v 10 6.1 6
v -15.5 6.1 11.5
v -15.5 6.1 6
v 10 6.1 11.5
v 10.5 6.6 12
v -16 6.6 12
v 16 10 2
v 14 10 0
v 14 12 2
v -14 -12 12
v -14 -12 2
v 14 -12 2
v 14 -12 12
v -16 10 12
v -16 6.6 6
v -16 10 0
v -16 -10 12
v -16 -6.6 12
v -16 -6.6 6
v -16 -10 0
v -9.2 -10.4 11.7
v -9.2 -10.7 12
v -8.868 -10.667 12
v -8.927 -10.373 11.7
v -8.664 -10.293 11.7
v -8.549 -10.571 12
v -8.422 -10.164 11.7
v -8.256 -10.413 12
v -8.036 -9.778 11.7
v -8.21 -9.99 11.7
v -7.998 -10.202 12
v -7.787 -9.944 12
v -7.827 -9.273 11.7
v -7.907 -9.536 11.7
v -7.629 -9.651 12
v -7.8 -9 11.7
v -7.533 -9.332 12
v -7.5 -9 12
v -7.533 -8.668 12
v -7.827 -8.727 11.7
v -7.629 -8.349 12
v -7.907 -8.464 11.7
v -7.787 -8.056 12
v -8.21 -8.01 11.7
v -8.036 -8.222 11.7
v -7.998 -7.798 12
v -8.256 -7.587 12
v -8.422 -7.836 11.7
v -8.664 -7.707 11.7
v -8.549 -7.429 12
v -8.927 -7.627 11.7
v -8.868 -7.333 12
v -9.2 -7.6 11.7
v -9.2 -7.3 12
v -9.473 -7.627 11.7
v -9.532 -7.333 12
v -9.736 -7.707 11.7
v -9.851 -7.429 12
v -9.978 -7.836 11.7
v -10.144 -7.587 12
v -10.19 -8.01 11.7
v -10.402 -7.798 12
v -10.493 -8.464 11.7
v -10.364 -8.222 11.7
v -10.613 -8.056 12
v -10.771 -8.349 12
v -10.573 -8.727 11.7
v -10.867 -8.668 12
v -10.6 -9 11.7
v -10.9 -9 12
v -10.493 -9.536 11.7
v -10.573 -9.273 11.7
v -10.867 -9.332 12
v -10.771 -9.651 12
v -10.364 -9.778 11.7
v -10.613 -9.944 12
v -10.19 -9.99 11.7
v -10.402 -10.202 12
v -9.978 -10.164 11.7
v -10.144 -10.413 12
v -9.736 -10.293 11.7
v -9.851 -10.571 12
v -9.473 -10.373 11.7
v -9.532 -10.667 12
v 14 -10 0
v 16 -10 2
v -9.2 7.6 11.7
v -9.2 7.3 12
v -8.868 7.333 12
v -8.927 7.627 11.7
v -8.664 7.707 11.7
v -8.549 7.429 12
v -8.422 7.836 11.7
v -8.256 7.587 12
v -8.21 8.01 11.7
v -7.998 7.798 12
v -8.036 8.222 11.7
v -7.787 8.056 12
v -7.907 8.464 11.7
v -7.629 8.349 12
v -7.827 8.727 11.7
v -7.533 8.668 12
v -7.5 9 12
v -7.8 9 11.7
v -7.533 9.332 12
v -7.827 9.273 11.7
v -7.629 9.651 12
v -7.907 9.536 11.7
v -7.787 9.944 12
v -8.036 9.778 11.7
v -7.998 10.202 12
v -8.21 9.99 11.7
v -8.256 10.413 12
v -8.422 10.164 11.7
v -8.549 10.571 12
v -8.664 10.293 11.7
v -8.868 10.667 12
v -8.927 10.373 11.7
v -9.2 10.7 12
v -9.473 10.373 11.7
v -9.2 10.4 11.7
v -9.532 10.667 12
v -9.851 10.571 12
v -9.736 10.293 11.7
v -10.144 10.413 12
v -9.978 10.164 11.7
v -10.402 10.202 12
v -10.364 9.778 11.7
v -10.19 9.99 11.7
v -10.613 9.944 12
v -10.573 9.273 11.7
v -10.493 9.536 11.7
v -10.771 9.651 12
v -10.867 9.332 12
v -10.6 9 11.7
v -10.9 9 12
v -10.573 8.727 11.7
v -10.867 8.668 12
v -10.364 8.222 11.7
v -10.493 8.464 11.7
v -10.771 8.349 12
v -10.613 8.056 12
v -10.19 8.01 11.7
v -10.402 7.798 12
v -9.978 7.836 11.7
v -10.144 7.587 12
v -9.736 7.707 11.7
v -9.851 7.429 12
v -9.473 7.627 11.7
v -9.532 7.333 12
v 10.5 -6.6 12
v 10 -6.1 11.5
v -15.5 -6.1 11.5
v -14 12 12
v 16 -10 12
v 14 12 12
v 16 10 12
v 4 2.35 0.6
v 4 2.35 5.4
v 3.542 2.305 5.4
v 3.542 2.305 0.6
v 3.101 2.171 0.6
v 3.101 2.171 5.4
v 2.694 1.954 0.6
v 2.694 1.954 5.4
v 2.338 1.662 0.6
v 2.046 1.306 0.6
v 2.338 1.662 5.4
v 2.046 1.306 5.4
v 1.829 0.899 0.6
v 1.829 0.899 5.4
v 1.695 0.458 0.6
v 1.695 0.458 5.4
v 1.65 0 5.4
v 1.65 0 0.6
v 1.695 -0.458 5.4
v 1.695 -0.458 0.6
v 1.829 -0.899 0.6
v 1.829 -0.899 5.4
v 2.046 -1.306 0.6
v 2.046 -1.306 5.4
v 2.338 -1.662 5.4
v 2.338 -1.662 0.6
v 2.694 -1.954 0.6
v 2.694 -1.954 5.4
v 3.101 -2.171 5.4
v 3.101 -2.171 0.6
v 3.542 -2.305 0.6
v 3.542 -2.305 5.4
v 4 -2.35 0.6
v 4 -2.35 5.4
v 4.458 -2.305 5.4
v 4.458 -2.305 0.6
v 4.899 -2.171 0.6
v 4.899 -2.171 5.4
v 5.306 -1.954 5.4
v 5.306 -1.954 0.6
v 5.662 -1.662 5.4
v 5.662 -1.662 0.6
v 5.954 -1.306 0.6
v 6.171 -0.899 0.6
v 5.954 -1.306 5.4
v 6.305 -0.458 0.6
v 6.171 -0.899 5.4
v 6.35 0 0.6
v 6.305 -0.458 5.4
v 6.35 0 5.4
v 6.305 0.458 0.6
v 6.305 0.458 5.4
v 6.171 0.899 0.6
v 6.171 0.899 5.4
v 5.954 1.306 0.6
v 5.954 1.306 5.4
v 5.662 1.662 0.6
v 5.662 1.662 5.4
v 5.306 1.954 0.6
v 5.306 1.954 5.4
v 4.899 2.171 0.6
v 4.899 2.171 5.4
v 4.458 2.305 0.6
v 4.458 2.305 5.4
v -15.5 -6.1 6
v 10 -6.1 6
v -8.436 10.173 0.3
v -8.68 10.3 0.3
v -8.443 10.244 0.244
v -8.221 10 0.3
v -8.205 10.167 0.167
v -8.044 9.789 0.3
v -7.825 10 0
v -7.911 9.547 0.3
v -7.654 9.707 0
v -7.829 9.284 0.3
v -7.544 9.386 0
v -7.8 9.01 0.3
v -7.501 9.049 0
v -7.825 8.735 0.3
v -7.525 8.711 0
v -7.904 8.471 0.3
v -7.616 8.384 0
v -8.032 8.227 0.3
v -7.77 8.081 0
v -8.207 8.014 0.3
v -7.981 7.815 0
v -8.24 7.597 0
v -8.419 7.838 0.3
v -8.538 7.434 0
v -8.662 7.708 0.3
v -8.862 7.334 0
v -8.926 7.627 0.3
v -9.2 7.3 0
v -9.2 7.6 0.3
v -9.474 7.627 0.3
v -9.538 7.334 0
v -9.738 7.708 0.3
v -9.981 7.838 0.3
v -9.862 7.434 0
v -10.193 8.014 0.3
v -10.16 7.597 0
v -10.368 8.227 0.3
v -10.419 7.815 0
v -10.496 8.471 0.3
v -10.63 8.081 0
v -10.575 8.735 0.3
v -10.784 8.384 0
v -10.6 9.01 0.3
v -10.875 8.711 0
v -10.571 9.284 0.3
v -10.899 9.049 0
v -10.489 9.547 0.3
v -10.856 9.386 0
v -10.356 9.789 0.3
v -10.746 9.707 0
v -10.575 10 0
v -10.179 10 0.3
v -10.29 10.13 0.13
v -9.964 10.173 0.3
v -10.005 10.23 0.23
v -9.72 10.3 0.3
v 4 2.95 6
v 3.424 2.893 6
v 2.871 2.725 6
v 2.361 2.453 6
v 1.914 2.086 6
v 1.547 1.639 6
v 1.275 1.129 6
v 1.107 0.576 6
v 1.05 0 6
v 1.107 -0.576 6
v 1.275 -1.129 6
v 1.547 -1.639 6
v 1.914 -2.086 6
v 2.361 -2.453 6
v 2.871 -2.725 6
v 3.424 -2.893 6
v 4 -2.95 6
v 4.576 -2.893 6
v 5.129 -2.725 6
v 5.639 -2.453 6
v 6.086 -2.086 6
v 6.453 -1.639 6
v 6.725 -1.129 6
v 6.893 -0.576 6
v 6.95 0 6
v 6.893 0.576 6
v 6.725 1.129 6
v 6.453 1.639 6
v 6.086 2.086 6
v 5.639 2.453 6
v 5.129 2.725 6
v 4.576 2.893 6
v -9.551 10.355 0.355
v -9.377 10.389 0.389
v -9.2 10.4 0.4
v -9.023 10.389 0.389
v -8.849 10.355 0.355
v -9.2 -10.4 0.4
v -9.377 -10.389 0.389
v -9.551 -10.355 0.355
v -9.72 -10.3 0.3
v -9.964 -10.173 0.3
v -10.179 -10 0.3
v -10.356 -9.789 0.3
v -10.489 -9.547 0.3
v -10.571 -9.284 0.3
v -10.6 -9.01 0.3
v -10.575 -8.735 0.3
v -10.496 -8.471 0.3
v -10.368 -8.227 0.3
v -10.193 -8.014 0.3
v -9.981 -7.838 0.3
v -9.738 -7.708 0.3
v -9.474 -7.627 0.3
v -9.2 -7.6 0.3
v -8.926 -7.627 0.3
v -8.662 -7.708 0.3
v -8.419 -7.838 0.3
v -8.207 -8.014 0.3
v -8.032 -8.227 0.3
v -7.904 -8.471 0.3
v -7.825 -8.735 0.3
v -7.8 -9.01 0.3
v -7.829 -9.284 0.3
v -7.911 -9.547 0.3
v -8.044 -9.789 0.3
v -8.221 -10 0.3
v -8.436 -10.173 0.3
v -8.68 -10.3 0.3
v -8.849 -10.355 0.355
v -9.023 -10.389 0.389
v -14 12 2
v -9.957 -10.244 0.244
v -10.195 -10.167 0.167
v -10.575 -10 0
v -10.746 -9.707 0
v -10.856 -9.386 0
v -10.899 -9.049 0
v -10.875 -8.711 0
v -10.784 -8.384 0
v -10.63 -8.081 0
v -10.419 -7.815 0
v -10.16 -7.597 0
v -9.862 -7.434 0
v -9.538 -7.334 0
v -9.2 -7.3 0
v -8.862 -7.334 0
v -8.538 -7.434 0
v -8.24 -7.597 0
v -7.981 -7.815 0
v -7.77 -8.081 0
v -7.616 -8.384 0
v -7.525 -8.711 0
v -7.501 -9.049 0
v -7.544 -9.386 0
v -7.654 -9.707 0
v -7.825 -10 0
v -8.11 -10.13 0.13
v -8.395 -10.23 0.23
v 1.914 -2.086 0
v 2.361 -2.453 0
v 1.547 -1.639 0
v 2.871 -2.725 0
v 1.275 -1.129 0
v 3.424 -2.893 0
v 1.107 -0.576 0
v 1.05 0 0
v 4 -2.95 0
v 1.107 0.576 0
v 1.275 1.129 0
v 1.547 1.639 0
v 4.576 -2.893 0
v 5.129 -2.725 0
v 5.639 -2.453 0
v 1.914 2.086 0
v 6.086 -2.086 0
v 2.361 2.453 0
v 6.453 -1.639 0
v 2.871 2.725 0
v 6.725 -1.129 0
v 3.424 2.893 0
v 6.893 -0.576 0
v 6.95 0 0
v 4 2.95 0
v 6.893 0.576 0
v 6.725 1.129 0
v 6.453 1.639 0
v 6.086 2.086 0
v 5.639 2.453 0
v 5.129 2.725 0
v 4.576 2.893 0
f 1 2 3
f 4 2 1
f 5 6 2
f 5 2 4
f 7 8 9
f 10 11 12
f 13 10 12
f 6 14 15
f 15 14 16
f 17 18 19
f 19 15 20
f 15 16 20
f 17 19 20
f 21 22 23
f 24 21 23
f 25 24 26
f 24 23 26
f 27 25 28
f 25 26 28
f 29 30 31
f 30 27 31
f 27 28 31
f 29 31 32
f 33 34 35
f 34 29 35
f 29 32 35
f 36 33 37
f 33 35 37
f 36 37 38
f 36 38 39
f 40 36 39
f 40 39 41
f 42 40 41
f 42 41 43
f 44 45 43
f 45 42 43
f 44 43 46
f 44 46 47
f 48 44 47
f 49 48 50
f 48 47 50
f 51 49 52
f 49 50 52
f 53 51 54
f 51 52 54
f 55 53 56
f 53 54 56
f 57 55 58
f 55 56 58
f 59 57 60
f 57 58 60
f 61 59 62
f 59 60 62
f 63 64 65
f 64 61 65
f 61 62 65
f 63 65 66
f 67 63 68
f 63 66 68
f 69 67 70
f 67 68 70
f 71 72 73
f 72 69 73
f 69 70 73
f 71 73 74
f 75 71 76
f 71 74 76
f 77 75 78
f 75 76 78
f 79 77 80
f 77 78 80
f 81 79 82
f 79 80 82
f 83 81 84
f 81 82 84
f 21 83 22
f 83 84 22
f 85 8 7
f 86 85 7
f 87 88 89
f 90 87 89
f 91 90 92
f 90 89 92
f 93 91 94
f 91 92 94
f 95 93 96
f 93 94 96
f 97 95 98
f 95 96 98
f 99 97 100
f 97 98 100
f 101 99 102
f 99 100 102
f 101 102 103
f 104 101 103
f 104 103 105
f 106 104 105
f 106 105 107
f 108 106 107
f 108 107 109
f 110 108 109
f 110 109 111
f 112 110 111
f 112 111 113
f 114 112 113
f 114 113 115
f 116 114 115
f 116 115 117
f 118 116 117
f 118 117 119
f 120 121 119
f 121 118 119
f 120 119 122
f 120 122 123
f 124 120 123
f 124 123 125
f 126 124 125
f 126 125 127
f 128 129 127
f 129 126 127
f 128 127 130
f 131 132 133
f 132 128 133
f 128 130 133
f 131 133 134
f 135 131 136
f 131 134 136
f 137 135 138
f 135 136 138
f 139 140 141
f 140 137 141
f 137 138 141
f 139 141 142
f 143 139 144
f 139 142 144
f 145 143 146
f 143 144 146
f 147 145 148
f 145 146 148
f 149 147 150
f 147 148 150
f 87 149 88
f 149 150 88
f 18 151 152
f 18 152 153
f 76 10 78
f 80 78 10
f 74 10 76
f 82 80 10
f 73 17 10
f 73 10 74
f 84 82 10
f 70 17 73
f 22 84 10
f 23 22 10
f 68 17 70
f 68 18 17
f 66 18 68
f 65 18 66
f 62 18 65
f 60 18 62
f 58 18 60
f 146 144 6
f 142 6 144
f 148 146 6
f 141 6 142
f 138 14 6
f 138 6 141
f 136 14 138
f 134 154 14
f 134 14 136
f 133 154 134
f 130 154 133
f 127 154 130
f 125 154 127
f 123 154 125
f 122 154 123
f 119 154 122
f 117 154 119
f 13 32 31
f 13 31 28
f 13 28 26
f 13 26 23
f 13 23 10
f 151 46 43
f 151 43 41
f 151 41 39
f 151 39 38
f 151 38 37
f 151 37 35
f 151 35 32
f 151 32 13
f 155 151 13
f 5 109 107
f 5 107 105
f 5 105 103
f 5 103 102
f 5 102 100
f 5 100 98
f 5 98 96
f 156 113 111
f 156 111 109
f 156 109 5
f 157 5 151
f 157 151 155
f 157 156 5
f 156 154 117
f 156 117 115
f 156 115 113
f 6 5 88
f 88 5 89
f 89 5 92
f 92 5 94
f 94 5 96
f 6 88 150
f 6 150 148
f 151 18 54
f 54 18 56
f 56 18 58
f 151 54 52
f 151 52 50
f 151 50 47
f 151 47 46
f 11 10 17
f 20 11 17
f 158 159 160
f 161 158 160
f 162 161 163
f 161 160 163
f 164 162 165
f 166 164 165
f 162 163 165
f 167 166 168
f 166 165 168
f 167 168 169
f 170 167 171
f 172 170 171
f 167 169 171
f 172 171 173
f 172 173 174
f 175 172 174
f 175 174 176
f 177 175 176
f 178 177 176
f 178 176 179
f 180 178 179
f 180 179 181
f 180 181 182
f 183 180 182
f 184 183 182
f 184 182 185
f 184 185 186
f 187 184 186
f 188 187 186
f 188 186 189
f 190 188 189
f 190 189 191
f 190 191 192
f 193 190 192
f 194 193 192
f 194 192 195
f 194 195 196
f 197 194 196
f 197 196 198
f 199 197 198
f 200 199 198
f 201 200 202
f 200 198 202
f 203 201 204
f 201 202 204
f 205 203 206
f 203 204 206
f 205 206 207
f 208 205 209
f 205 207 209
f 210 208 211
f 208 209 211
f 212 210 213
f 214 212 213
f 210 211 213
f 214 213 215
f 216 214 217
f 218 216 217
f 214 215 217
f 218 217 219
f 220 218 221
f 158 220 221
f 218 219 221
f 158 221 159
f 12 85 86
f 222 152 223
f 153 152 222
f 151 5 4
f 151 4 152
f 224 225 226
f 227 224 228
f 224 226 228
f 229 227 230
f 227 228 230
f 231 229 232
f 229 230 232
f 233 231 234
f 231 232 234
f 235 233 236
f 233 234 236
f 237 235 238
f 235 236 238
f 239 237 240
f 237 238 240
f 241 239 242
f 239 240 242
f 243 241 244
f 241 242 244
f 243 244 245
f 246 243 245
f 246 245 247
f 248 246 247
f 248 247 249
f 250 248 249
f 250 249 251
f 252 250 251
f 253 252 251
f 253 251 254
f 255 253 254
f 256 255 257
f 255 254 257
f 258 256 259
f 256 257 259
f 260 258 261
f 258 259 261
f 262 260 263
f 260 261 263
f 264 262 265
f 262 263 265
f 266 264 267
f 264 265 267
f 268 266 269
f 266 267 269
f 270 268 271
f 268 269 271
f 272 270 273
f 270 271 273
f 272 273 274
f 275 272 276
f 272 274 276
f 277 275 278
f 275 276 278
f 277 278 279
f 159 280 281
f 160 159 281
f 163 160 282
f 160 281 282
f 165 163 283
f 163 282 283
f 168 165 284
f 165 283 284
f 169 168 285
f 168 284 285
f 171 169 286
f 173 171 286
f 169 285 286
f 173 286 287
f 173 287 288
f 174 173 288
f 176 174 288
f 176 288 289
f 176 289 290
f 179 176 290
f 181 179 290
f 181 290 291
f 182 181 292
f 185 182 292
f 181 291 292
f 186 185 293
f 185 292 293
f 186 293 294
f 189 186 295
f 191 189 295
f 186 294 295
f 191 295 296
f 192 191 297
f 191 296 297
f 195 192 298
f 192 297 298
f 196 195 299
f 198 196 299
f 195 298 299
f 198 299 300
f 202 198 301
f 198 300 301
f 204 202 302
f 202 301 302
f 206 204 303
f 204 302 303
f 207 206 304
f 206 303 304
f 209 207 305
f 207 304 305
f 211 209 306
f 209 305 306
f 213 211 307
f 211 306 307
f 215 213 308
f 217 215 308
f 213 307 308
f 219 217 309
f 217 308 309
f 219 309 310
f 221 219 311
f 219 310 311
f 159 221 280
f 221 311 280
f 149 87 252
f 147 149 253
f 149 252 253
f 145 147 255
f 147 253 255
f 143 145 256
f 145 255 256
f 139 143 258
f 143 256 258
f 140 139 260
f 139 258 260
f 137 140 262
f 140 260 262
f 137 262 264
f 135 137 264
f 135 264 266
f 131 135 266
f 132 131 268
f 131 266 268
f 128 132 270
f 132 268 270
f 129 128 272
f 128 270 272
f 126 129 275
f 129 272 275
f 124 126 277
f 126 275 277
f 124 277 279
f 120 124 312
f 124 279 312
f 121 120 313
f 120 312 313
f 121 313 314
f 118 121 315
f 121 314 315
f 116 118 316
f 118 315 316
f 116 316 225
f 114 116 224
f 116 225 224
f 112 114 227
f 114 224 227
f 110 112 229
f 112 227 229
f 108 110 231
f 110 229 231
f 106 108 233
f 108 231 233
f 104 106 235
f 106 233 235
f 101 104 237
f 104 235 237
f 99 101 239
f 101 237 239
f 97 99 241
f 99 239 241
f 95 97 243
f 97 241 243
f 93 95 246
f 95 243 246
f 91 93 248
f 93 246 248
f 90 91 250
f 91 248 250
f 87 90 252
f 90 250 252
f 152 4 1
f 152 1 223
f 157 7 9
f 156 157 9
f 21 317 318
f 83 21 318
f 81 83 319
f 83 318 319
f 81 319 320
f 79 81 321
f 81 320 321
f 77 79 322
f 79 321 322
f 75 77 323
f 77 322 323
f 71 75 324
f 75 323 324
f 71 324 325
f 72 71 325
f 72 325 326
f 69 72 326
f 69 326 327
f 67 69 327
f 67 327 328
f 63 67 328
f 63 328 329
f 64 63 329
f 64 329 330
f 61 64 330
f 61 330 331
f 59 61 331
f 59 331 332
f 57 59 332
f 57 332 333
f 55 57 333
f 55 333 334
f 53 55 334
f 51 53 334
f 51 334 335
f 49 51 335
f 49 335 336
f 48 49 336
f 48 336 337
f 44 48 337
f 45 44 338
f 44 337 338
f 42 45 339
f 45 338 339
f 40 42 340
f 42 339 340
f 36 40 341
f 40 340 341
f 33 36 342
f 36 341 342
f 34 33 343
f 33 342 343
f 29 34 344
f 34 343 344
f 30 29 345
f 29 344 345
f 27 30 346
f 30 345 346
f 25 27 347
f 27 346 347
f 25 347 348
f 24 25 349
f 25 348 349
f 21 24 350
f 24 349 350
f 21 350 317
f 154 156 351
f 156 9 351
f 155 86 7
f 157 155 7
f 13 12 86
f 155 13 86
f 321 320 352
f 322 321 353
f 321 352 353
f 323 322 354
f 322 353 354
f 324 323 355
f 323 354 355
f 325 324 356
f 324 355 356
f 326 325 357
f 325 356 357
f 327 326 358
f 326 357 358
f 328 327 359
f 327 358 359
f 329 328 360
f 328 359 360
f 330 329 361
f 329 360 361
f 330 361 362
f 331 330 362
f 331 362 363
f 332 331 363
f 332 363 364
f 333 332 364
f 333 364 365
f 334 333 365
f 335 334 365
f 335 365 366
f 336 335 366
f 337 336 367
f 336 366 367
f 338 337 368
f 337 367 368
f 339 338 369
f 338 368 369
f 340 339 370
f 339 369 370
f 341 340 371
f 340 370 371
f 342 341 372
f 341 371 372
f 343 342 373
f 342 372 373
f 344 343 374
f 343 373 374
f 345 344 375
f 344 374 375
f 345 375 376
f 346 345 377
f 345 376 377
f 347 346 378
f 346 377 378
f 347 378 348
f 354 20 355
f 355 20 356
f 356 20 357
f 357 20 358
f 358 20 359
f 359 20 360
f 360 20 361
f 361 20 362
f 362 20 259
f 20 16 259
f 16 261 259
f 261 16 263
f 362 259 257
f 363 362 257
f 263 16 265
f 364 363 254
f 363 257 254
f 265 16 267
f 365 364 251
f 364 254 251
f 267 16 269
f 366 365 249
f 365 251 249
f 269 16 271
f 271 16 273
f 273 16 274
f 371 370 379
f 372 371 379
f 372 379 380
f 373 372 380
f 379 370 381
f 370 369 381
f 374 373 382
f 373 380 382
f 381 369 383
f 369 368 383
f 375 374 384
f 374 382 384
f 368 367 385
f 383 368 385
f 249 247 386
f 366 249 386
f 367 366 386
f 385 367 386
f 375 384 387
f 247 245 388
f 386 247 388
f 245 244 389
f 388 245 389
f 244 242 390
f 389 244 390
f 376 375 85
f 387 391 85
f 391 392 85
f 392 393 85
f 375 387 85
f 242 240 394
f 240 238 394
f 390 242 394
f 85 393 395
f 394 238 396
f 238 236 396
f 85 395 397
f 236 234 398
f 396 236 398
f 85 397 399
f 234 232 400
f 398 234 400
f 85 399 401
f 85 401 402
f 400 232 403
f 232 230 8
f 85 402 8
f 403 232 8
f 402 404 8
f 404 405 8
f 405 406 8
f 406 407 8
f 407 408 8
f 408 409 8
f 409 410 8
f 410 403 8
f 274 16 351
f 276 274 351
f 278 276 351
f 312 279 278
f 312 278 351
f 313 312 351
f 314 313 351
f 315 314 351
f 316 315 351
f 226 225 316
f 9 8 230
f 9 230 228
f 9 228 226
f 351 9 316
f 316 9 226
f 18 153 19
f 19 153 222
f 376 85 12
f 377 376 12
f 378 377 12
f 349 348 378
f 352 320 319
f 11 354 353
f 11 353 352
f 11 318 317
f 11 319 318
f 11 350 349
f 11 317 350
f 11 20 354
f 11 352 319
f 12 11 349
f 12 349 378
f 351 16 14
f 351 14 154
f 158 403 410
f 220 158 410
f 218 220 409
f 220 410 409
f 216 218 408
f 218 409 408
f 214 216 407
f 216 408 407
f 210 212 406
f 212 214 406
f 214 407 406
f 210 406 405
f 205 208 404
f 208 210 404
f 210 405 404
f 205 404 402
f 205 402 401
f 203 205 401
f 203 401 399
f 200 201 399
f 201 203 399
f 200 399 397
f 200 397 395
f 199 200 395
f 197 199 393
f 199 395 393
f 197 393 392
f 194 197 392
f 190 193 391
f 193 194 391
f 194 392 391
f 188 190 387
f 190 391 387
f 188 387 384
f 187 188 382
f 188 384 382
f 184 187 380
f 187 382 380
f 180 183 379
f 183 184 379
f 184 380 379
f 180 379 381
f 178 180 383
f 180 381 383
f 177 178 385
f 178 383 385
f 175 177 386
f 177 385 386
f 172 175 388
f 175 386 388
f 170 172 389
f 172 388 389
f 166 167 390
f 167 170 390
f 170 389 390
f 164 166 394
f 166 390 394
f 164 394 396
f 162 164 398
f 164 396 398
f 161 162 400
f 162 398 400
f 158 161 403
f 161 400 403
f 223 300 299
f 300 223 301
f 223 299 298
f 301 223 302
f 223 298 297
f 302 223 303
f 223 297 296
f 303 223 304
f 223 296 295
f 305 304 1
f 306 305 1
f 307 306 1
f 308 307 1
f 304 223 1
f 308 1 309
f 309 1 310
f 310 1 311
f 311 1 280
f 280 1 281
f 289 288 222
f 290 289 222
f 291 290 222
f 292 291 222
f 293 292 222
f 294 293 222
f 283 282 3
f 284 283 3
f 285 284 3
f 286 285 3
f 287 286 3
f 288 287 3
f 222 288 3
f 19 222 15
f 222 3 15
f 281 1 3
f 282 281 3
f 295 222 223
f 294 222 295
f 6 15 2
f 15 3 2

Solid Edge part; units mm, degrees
sketch "Sketch1" plane through (0, 0, 0) normal (0, 0, 1) x (1, 0, 0)
  line L0 (-16, -12) -> (16, -12)
  line L1 (16, -12) -> (16, 12)
  line L2 (16, 12) -> (-16, 12)
  line L3 (-16, 12) -> (-16, -12)
  dimension "D1" = 24
  dimension "D2" = 32
extrude "Protrusion1" add sketch "Sketch1" along normal blind 12
sketch "Sketch2" plane through (0, 0, 12) normal (0, 0, 1) x (0, 1, 0)
  line L0 (-6.1, 16) -> (6.1, 16)
  line L1 (6.1, 16) -> (6.1, -10)
  line L2 (6.1, -10) -> (-6.1, -10)
  line L3 (-6.1, -10) -> (-6.1, 16)
  dimension "D1" = 12.2
  dimension "D2" = 26
extrude "servo_cutout" cut sketch "Sketch2" against normal blind 6
hole "screw_bearing" at (4, 0, 0) direction (0, 0, 1) diameter 4.7 depth 30 tip angle 118 start chamfer 0.6 start chamfer angle 45 end chamfer 0.6 end chamfer angle 45
chamfer "Chamfer1" distance 0.5 angle 45 5 edges at (-3, -6.1, 12) (-16, -6.1, 9) (10, 0, 12) (-3, 6.1, 12) (-16, 6.1, 9)
hole "Hole1" at (-9.2, 9, 12) direction (0, 0, -1) diameter 2.8 depth 30 tip angle 118 start chamfer 0.3 start chamfer angle 45 end chamfer 0.3 end chamfer angle 45
hole "Hole2" at (-9.2, -9, 12) direction (0, 0, -1) diameter 2.8 depth 30 tip angle 118 start chamfer 0.3 start chamfer angle 45 end chamfer 0.3 end chamfer angle 45
chamfer "Chamfer2" distance 2 angle 45 7 edges at (16, 12, 6) (0, 12, 0) (16, 0, 0) (0, -12, 0) (16, -12, 6) (-16, 12, 6) (-16, -12, 6)
properties material "Polypropylene, general purpose"
